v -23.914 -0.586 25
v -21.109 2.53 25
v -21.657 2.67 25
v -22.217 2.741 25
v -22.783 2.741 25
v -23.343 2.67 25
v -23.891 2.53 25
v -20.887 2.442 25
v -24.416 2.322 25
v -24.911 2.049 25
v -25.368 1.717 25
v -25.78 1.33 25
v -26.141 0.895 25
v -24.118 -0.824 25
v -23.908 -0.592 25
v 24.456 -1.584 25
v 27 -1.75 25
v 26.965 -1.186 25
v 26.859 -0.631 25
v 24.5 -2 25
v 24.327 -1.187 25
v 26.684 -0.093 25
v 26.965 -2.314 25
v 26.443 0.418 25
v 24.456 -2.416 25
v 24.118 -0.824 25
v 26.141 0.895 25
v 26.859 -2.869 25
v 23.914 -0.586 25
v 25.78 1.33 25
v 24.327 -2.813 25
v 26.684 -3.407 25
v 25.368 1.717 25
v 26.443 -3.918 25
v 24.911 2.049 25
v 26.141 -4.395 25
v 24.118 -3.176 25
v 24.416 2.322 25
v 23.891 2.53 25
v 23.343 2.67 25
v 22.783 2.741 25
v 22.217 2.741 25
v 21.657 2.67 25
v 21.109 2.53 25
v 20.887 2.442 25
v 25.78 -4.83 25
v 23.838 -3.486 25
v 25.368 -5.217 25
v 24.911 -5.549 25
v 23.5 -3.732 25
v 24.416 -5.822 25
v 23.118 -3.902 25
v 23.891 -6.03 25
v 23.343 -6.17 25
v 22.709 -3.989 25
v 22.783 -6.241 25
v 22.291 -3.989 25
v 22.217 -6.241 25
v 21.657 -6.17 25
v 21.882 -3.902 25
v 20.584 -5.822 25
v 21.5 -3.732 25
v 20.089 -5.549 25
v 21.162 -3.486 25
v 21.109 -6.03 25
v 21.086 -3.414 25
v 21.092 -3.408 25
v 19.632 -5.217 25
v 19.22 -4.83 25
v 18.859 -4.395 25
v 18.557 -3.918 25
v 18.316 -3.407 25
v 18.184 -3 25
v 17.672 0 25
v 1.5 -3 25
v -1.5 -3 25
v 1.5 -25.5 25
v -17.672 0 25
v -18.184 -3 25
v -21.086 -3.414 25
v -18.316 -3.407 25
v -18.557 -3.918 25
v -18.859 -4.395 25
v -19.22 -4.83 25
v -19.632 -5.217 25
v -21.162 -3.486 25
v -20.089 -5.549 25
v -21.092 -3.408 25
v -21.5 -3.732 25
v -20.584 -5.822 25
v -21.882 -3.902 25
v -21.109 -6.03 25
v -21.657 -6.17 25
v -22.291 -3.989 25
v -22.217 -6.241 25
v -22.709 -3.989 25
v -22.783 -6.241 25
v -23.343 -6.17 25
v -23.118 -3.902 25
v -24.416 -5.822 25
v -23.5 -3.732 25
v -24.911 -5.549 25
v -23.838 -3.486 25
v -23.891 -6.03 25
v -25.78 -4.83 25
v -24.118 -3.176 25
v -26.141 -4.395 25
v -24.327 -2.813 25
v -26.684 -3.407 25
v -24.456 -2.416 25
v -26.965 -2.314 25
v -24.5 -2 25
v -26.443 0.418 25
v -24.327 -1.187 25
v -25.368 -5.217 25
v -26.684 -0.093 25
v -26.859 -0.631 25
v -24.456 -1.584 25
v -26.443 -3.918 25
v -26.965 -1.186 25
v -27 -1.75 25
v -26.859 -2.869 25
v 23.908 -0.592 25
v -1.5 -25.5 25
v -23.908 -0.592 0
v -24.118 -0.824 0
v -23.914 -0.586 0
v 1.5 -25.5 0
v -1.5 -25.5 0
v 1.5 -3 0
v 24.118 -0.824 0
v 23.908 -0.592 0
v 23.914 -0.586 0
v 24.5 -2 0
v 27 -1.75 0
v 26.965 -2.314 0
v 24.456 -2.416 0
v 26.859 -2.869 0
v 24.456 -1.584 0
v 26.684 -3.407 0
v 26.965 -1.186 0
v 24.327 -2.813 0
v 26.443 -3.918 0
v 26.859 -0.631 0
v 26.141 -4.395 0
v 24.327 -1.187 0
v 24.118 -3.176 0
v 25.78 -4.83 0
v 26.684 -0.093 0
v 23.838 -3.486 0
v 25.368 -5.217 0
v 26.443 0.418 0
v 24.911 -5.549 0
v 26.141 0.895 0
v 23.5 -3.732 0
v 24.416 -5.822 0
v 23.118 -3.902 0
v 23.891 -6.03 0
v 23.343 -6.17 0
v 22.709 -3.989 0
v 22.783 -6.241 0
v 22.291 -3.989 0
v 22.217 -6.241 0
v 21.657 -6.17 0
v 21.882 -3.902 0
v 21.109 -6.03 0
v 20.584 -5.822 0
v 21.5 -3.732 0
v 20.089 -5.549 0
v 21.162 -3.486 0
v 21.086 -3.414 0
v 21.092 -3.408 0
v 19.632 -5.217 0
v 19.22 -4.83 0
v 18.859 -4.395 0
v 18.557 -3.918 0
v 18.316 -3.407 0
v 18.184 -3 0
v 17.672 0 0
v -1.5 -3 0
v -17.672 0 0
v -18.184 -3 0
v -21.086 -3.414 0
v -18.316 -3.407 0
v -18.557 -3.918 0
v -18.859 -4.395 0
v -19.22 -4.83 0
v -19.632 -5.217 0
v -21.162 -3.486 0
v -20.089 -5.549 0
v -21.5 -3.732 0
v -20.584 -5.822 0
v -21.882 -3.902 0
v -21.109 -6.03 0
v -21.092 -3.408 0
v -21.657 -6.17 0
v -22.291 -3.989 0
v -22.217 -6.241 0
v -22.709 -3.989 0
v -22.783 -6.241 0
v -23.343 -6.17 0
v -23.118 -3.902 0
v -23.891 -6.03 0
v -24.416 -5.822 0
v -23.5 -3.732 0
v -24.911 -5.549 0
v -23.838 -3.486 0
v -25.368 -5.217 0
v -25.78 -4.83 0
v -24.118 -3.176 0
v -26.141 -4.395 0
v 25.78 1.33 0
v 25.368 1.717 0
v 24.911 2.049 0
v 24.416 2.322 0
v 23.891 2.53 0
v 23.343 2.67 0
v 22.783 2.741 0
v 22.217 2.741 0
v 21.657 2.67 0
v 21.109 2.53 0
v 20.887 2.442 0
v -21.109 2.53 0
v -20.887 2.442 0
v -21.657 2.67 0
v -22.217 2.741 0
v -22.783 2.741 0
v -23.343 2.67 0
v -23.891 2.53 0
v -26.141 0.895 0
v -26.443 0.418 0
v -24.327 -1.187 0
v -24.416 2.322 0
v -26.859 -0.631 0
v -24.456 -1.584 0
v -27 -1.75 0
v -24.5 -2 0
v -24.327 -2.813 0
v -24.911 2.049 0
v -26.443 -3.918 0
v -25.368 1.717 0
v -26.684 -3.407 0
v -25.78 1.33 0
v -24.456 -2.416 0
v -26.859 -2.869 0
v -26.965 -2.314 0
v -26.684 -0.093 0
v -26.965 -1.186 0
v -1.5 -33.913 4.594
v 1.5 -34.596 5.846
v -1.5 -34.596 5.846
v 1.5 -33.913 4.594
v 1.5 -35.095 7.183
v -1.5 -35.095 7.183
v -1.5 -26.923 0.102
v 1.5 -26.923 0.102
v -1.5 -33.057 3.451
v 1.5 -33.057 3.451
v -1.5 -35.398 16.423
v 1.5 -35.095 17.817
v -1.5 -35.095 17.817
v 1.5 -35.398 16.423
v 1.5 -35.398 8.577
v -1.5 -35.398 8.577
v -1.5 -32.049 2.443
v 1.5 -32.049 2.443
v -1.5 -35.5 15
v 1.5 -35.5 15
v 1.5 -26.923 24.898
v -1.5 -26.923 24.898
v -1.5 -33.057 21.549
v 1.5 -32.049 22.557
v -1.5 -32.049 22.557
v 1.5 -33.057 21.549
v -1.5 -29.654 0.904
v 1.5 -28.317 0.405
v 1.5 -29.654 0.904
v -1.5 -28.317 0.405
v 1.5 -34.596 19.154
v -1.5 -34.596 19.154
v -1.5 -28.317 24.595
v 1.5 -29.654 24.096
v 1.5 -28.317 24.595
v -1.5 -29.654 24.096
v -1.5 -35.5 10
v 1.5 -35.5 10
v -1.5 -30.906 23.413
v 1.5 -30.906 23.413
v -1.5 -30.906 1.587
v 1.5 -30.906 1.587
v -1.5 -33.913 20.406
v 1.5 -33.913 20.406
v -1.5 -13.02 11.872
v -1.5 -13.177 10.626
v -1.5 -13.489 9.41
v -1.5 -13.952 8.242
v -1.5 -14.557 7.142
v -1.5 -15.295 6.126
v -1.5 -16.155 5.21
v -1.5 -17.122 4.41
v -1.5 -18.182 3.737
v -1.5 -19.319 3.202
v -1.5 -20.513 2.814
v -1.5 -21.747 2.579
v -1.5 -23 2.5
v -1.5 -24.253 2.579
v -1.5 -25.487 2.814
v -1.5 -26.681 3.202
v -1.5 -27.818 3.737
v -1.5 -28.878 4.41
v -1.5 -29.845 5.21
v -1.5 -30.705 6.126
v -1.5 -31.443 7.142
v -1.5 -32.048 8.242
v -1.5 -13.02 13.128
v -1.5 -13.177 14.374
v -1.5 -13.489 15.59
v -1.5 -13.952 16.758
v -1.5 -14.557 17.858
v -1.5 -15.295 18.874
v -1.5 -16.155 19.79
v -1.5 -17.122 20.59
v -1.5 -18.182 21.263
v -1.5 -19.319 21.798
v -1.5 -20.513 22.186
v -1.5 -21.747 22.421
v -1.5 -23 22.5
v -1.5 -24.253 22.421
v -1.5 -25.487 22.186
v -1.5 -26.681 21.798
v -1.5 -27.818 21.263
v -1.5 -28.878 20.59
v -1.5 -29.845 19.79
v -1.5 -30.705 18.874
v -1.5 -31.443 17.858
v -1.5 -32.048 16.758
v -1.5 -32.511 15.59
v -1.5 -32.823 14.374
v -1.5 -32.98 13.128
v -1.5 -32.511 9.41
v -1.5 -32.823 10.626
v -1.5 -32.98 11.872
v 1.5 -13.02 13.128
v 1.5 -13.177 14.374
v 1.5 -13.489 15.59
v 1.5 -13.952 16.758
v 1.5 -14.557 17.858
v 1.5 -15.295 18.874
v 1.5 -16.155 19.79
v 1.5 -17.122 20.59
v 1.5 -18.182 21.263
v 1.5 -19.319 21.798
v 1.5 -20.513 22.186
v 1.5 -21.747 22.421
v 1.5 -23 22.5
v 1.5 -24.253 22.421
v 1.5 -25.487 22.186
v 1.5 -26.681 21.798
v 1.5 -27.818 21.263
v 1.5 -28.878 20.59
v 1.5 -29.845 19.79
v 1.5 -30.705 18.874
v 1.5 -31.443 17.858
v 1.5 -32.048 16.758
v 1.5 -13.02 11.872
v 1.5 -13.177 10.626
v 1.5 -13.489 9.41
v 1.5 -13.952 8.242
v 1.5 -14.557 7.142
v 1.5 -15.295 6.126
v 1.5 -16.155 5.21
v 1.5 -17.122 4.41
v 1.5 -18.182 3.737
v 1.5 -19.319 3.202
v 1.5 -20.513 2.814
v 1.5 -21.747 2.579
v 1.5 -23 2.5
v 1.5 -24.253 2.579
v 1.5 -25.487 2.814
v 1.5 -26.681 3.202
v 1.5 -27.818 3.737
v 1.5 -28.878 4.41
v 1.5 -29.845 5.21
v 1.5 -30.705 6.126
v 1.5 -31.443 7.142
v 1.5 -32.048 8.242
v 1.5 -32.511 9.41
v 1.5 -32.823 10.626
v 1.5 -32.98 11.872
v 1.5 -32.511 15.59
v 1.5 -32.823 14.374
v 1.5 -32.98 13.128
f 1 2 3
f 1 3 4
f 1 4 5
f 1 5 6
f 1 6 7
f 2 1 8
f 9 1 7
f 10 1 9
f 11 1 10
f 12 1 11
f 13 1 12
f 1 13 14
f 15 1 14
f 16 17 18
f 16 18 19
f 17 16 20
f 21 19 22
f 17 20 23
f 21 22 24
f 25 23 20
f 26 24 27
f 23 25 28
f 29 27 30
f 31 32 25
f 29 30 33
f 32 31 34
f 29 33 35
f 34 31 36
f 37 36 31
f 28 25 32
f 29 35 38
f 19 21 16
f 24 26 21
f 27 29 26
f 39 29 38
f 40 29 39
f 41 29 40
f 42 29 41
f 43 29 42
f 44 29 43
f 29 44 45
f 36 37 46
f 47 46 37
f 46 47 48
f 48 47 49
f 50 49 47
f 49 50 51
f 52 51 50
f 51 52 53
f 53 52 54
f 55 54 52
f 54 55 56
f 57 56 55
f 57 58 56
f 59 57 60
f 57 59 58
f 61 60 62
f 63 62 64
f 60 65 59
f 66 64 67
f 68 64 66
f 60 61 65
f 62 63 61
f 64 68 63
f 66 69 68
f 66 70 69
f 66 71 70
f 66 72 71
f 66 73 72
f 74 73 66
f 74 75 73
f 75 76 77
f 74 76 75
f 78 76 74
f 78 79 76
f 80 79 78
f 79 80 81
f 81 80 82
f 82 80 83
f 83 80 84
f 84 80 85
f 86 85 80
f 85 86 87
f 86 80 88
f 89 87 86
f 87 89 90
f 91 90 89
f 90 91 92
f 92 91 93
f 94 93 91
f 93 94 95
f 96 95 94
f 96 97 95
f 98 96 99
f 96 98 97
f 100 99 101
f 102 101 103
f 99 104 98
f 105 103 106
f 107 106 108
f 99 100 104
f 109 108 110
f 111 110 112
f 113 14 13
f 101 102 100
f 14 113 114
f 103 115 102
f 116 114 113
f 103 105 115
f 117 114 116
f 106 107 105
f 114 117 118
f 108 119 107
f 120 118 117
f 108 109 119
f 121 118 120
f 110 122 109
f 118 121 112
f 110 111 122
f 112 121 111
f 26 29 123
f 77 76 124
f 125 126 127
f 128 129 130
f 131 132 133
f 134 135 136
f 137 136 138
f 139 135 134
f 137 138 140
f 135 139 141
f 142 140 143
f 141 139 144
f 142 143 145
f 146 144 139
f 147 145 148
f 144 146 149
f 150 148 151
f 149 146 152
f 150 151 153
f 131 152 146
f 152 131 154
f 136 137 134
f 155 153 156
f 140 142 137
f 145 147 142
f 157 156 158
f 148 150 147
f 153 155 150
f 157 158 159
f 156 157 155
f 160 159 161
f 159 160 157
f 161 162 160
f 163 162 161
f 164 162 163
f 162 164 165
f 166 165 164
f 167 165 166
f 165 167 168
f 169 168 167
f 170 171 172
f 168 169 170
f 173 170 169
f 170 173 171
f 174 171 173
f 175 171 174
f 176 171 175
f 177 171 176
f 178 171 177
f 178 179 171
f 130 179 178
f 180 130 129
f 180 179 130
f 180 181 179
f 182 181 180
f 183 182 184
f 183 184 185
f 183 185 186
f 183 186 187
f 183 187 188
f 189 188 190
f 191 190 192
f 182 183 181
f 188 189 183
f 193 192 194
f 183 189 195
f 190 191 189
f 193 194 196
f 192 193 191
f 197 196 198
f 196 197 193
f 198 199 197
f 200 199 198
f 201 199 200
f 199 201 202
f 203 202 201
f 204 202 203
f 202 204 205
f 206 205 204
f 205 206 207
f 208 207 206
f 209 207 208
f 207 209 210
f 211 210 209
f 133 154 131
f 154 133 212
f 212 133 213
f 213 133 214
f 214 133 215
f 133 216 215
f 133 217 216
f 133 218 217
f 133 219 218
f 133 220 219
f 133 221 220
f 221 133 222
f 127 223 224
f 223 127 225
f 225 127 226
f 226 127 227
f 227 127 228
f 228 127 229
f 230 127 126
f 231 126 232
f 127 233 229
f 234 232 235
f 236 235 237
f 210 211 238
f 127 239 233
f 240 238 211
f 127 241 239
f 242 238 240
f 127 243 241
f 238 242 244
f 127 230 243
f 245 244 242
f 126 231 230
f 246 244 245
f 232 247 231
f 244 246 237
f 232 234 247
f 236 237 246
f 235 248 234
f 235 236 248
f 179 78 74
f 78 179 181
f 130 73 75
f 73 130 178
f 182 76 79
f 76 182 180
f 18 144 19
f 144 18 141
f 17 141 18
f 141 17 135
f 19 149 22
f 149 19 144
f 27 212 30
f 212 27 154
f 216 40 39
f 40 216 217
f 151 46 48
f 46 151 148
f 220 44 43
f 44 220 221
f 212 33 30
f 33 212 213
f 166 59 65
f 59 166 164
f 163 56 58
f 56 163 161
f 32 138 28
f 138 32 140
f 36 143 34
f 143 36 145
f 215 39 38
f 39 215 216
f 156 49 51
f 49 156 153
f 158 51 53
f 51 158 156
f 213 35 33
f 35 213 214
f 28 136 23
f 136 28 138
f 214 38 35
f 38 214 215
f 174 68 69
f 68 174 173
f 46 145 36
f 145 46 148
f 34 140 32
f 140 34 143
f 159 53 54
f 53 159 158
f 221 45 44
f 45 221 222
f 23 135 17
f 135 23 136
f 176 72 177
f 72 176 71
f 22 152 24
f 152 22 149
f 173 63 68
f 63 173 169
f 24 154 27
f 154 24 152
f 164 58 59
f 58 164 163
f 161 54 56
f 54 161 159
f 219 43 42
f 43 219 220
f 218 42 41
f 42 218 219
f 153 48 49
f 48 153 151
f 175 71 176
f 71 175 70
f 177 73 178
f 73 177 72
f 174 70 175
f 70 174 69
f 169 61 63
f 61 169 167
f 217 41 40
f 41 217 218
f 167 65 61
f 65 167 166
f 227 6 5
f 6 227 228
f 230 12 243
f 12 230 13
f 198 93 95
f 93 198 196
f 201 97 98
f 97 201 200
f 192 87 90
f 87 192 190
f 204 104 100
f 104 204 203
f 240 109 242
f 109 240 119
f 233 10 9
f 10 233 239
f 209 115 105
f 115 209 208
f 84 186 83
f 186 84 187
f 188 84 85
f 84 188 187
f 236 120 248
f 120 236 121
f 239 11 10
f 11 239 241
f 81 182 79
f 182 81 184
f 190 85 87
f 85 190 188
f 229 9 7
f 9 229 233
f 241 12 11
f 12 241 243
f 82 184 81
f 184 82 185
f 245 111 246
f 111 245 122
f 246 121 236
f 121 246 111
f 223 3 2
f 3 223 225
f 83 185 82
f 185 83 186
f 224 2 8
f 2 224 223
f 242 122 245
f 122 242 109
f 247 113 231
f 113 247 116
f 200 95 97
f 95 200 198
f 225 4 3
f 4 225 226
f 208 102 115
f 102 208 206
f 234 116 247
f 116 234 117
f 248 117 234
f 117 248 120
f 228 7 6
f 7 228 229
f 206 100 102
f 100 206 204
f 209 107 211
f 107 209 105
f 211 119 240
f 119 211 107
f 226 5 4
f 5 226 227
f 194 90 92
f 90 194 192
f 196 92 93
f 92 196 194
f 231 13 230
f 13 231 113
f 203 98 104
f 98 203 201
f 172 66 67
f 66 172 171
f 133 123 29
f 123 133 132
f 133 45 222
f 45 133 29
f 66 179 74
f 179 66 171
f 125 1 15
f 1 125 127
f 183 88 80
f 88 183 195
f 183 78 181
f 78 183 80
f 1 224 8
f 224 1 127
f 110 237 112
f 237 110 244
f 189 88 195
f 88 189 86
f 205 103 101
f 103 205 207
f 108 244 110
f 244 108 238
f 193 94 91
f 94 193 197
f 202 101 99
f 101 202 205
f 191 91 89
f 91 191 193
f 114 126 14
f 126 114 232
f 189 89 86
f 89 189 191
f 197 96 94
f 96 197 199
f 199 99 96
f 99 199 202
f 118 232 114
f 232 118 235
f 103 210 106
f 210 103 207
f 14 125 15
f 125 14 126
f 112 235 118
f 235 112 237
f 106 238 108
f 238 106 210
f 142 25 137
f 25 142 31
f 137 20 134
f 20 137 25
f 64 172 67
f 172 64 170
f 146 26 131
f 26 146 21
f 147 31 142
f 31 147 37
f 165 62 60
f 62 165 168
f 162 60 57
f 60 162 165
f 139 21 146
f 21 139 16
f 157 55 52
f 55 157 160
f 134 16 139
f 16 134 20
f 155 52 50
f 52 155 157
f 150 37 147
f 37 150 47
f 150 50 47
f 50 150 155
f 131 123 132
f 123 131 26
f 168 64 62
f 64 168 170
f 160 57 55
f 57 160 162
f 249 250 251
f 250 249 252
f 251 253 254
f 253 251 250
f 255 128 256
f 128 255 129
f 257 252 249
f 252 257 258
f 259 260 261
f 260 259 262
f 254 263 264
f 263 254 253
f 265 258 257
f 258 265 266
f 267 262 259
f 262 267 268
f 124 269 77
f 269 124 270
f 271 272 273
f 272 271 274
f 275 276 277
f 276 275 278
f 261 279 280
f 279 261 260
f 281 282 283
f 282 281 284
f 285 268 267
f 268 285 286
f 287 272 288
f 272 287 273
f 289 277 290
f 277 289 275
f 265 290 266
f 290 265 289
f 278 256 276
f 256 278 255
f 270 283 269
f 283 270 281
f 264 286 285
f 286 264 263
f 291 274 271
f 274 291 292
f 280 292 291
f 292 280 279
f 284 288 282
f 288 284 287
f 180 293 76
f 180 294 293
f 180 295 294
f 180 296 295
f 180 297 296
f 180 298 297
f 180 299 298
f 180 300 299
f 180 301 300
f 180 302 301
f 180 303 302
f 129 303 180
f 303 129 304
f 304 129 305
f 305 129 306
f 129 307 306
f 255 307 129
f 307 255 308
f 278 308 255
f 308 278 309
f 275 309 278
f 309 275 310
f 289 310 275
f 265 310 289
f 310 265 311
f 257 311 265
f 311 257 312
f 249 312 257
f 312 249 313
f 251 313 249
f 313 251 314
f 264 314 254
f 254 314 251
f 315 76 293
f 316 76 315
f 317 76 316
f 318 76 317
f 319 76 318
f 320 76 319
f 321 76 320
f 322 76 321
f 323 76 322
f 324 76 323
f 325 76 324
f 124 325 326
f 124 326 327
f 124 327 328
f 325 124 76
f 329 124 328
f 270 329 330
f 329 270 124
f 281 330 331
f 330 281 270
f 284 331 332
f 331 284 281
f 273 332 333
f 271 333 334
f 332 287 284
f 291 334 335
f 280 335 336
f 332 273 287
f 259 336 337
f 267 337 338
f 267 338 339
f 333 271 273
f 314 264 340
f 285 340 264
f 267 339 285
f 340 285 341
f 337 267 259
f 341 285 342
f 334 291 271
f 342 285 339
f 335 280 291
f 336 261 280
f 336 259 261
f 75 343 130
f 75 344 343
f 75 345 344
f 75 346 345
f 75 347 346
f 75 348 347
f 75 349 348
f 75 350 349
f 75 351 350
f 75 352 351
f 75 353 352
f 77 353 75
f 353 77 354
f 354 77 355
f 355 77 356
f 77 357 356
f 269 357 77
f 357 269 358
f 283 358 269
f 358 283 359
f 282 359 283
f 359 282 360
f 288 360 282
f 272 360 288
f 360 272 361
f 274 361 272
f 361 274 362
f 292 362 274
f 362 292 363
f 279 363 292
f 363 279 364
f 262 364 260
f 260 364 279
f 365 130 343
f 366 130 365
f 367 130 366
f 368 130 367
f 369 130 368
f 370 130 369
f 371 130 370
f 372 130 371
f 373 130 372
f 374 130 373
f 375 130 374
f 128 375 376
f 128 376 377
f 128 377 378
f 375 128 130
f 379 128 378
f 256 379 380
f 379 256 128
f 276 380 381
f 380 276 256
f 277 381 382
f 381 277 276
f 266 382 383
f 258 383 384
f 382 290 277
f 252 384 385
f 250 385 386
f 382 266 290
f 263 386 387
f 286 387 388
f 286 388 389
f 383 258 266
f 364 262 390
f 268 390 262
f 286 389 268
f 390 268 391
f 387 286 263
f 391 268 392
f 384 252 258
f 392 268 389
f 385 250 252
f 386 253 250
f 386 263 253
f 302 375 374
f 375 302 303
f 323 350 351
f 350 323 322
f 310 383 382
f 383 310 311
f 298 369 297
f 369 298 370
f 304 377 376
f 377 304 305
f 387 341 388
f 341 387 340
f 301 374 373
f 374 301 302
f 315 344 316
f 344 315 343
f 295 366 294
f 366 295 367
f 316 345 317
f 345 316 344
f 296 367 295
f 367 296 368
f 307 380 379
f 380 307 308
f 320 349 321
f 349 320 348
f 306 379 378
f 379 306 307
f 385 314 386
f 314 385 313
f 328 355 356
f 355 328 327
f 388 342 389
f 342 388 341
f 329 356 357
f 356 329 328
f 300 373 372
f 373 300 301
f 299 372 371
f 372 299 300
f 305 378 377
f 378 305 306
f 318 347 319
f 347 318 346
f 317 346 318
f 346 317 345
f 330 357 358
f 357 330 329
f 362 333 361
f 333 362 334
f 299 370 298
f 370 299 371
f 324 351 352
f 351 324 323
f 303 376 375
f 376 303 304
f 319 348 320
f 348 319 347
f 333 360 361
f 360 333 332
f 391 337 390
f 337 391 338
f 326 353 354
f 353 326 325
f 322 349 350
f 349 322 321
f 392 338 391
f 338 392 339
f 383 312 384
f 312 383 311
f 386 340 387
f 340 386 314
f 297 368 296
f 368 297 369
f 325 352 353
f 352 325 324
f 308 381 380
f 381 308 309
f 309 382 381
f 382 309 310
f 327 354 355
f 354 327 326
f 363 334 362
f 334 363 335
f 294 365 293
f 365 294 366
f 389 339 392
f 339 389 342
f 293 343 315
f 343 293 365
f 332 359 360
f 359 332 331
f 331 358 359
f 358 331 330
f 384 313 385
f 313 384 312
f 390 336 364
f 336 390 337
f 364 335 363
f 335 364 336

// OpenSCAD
// file: obiscad/bcube.scad
//------------------------------------------------------------------------------
//  Bevel edge cube.
//  (c) Juan Gonzalez-Gomez (Obijuan), Sep-2012
//------------------------------------------------------------------------------

//----------------- IMPLEMENTATION USING THE MINKOWSKI OPERATOR ----------------

//------------------------------------------------------------------------------
//-- Bevel Cube main function
//-- Parameters:
//--   * Size:  Cube size
//--   * cr : Corner radius (if cr==0, a standar cube is built)
//--   * cres:  Corner resolution (in points). cres=0 means flat corners
//------------------------------------------------------------------------------
module bcube(size,cr=0,cres=0)
{
  //-- Internal cube size
  bsize = size - 2*[cr,cr,0];

  //-- Get the (x,y) coorner coordinates in the 1st cuadrant
  x = bsize[0]/2;
  y = bsize[1]/2;

  //-- A corner radius of 0 means a standar cube!
  if (cr==0)
    cube(bsize,center=true);
  else {

      
      //-- The height of minkowski object is double. So
      //-- we sould scale by 0.5
      scale([1,1,0.5])

      //-- This translation is for centering the minkowski objet
      translate([-x, -y,0])

      //-- Built the  beveled cube with minkowski
      minkowski() {

        //-- Internal cube
        cube(bsize,center=true);

        //-- Cylinder in the corner (1st cuadrant)
        translate([x,y, 0])
          cylinder(r=cr, h=bsize[2],center=true, $fn=4*(cres+1));
      }
  }

}


//-- Examples of use of the bcube() module

//-- Standar cube
translate([-15,15,0])
bcube([20,20,10]);

//-- Beveled cube (0 point resolution)
translate([15,15,0])
  bcube([20,20,10],cr=4);

//-- Beveled cube (1 point resolution)
translate([-15,-15,0])
  bcube([20,20,10],cr=4, cres=1);

//-- Beveled cube (4 points resolution)
translate([15,-15,0])
  bcube([20,20,10],cr=4, cres=4);
// file: wire_frame.scad
// -*- mode: SCAD; tab-width: 4; -*-

default_wire_diameter = 2.4;
default_wire_slot_depth = 1;
default_wire_shroud_thickness = 1;

module wire_shroud(spacing,wires,width,diameter=default_wire_diameter)
{
	difference() {
		wire_frame(spacing,wires,width,diameter+default_wire_shroud_thickness/2);
		translate([0,0,-diameter/2])
		
		cube([spacing*wires,width,diameter],center=true);
	}
}

module wire_frame(spacing,wires,width,diameter=default_wire_diameter,hull=true) {
	translate([-(wires-1)*spacing/2,0,0])
	for (w = [1:wires]) {
		translate([(w-1)*spacing,0,0])
		rotate([90,0,0])
		translate([0,diameter/2,0])
		if (hull) {
			hull() {
				cylinder(r=diameter/2,h=width,center=true,$fs=0.1);
				translate([0,-diameter/2,0])
				cube([diameter,diameter,width],center=true);
			}
		} else {
			cylinder(r=diameter/2,h=width,center=true,$fs=0.1);
		}
	}
}
// main file
// -*- mode: SCAD; tab-width: 4; -*-

use <wire_frame.scad>
use <obiscad/bcube.scad>

overlap = .2;

wire_spacing = 45;
wire_width = 215;
wire_num = 2;
wire_diameter = 4; // actual 3.75

razor_handle_diameter = 20; // actual 15

rack_width = razor_handle_diameter + 5;
rack_depth = razor_handle_diameter + 10;
rack_thickness = 3;

part = "rack";

print_part();

module print_part() {
	if (part == "rack") {
		razor_rack();
	}
}

module rack() {
	translate([0/*wire_spacing/4*/,-rack_thickness-rack_depth/2,rack_width/2])
	// scale([1,0.5,1])
	difference() {
		union() {
			rotate([0,90,0])
			bcube([rack_width,rack_depth+5,rack_thickness],cr=10,cres=10);
			translate([0,(rack_depth+5)/4,0])
			cube([rack_thickness,(rack_depth+5)/2,rack_width],center=true);
		}
		translate([0,-5,0])
		rotate([0,90,0])
		cylinder(r=razor_handle_diameter/2,h=rack_thickness+overlap*2,center=true,$fn=50);
	}
}

module rack_body() {
	difference() {
		union() {
			translate([0,-rack_thickness/2,rack_width/2])
			cube([wire_spacing-wire_diameter,rack_thickness,rack_width],center=true);

			translate([wire_spacing/2,-(wire_diameter+rack_thickness)/4,0])
			cylinder(r=(wire_diameter*1.5+rack_thickness)/2,h=rack_width,$fn=50);

			translate([-wire_spacing/2,-(wire_diameter+rack_thickness)/4,0])
			cylinder(r=(wire_diameter*1.5+rack_thickness)/2,h=rack_width,$fn=50);
		}

		translate([wire_spacing/2,-wire_diameter/2,0])
		rotate([0,0,-45])
		translate([-wire_diameter*2,0,rack_width/2])
		cube([wire_diameter*4,wire_diameter,rack_width+overlap*2],center=true);

		translate([-wire_spacing/2,-wire_diameter/2,0])
		rotate([0,0,-135])
		translate([-wire_diameter*2,0,rack_width/2])
		cube([wire_diameter*4,wire_diameter,rack_width+overlap*2],center=true);
	}
}

module razor_rack() {
	difference() {
		rack_body();
		rotate([90,0,0])
		wire_frame(wire_spacing,wire_num,wire_width,wire_diameter,hull=false);
	}
	rack();
}
